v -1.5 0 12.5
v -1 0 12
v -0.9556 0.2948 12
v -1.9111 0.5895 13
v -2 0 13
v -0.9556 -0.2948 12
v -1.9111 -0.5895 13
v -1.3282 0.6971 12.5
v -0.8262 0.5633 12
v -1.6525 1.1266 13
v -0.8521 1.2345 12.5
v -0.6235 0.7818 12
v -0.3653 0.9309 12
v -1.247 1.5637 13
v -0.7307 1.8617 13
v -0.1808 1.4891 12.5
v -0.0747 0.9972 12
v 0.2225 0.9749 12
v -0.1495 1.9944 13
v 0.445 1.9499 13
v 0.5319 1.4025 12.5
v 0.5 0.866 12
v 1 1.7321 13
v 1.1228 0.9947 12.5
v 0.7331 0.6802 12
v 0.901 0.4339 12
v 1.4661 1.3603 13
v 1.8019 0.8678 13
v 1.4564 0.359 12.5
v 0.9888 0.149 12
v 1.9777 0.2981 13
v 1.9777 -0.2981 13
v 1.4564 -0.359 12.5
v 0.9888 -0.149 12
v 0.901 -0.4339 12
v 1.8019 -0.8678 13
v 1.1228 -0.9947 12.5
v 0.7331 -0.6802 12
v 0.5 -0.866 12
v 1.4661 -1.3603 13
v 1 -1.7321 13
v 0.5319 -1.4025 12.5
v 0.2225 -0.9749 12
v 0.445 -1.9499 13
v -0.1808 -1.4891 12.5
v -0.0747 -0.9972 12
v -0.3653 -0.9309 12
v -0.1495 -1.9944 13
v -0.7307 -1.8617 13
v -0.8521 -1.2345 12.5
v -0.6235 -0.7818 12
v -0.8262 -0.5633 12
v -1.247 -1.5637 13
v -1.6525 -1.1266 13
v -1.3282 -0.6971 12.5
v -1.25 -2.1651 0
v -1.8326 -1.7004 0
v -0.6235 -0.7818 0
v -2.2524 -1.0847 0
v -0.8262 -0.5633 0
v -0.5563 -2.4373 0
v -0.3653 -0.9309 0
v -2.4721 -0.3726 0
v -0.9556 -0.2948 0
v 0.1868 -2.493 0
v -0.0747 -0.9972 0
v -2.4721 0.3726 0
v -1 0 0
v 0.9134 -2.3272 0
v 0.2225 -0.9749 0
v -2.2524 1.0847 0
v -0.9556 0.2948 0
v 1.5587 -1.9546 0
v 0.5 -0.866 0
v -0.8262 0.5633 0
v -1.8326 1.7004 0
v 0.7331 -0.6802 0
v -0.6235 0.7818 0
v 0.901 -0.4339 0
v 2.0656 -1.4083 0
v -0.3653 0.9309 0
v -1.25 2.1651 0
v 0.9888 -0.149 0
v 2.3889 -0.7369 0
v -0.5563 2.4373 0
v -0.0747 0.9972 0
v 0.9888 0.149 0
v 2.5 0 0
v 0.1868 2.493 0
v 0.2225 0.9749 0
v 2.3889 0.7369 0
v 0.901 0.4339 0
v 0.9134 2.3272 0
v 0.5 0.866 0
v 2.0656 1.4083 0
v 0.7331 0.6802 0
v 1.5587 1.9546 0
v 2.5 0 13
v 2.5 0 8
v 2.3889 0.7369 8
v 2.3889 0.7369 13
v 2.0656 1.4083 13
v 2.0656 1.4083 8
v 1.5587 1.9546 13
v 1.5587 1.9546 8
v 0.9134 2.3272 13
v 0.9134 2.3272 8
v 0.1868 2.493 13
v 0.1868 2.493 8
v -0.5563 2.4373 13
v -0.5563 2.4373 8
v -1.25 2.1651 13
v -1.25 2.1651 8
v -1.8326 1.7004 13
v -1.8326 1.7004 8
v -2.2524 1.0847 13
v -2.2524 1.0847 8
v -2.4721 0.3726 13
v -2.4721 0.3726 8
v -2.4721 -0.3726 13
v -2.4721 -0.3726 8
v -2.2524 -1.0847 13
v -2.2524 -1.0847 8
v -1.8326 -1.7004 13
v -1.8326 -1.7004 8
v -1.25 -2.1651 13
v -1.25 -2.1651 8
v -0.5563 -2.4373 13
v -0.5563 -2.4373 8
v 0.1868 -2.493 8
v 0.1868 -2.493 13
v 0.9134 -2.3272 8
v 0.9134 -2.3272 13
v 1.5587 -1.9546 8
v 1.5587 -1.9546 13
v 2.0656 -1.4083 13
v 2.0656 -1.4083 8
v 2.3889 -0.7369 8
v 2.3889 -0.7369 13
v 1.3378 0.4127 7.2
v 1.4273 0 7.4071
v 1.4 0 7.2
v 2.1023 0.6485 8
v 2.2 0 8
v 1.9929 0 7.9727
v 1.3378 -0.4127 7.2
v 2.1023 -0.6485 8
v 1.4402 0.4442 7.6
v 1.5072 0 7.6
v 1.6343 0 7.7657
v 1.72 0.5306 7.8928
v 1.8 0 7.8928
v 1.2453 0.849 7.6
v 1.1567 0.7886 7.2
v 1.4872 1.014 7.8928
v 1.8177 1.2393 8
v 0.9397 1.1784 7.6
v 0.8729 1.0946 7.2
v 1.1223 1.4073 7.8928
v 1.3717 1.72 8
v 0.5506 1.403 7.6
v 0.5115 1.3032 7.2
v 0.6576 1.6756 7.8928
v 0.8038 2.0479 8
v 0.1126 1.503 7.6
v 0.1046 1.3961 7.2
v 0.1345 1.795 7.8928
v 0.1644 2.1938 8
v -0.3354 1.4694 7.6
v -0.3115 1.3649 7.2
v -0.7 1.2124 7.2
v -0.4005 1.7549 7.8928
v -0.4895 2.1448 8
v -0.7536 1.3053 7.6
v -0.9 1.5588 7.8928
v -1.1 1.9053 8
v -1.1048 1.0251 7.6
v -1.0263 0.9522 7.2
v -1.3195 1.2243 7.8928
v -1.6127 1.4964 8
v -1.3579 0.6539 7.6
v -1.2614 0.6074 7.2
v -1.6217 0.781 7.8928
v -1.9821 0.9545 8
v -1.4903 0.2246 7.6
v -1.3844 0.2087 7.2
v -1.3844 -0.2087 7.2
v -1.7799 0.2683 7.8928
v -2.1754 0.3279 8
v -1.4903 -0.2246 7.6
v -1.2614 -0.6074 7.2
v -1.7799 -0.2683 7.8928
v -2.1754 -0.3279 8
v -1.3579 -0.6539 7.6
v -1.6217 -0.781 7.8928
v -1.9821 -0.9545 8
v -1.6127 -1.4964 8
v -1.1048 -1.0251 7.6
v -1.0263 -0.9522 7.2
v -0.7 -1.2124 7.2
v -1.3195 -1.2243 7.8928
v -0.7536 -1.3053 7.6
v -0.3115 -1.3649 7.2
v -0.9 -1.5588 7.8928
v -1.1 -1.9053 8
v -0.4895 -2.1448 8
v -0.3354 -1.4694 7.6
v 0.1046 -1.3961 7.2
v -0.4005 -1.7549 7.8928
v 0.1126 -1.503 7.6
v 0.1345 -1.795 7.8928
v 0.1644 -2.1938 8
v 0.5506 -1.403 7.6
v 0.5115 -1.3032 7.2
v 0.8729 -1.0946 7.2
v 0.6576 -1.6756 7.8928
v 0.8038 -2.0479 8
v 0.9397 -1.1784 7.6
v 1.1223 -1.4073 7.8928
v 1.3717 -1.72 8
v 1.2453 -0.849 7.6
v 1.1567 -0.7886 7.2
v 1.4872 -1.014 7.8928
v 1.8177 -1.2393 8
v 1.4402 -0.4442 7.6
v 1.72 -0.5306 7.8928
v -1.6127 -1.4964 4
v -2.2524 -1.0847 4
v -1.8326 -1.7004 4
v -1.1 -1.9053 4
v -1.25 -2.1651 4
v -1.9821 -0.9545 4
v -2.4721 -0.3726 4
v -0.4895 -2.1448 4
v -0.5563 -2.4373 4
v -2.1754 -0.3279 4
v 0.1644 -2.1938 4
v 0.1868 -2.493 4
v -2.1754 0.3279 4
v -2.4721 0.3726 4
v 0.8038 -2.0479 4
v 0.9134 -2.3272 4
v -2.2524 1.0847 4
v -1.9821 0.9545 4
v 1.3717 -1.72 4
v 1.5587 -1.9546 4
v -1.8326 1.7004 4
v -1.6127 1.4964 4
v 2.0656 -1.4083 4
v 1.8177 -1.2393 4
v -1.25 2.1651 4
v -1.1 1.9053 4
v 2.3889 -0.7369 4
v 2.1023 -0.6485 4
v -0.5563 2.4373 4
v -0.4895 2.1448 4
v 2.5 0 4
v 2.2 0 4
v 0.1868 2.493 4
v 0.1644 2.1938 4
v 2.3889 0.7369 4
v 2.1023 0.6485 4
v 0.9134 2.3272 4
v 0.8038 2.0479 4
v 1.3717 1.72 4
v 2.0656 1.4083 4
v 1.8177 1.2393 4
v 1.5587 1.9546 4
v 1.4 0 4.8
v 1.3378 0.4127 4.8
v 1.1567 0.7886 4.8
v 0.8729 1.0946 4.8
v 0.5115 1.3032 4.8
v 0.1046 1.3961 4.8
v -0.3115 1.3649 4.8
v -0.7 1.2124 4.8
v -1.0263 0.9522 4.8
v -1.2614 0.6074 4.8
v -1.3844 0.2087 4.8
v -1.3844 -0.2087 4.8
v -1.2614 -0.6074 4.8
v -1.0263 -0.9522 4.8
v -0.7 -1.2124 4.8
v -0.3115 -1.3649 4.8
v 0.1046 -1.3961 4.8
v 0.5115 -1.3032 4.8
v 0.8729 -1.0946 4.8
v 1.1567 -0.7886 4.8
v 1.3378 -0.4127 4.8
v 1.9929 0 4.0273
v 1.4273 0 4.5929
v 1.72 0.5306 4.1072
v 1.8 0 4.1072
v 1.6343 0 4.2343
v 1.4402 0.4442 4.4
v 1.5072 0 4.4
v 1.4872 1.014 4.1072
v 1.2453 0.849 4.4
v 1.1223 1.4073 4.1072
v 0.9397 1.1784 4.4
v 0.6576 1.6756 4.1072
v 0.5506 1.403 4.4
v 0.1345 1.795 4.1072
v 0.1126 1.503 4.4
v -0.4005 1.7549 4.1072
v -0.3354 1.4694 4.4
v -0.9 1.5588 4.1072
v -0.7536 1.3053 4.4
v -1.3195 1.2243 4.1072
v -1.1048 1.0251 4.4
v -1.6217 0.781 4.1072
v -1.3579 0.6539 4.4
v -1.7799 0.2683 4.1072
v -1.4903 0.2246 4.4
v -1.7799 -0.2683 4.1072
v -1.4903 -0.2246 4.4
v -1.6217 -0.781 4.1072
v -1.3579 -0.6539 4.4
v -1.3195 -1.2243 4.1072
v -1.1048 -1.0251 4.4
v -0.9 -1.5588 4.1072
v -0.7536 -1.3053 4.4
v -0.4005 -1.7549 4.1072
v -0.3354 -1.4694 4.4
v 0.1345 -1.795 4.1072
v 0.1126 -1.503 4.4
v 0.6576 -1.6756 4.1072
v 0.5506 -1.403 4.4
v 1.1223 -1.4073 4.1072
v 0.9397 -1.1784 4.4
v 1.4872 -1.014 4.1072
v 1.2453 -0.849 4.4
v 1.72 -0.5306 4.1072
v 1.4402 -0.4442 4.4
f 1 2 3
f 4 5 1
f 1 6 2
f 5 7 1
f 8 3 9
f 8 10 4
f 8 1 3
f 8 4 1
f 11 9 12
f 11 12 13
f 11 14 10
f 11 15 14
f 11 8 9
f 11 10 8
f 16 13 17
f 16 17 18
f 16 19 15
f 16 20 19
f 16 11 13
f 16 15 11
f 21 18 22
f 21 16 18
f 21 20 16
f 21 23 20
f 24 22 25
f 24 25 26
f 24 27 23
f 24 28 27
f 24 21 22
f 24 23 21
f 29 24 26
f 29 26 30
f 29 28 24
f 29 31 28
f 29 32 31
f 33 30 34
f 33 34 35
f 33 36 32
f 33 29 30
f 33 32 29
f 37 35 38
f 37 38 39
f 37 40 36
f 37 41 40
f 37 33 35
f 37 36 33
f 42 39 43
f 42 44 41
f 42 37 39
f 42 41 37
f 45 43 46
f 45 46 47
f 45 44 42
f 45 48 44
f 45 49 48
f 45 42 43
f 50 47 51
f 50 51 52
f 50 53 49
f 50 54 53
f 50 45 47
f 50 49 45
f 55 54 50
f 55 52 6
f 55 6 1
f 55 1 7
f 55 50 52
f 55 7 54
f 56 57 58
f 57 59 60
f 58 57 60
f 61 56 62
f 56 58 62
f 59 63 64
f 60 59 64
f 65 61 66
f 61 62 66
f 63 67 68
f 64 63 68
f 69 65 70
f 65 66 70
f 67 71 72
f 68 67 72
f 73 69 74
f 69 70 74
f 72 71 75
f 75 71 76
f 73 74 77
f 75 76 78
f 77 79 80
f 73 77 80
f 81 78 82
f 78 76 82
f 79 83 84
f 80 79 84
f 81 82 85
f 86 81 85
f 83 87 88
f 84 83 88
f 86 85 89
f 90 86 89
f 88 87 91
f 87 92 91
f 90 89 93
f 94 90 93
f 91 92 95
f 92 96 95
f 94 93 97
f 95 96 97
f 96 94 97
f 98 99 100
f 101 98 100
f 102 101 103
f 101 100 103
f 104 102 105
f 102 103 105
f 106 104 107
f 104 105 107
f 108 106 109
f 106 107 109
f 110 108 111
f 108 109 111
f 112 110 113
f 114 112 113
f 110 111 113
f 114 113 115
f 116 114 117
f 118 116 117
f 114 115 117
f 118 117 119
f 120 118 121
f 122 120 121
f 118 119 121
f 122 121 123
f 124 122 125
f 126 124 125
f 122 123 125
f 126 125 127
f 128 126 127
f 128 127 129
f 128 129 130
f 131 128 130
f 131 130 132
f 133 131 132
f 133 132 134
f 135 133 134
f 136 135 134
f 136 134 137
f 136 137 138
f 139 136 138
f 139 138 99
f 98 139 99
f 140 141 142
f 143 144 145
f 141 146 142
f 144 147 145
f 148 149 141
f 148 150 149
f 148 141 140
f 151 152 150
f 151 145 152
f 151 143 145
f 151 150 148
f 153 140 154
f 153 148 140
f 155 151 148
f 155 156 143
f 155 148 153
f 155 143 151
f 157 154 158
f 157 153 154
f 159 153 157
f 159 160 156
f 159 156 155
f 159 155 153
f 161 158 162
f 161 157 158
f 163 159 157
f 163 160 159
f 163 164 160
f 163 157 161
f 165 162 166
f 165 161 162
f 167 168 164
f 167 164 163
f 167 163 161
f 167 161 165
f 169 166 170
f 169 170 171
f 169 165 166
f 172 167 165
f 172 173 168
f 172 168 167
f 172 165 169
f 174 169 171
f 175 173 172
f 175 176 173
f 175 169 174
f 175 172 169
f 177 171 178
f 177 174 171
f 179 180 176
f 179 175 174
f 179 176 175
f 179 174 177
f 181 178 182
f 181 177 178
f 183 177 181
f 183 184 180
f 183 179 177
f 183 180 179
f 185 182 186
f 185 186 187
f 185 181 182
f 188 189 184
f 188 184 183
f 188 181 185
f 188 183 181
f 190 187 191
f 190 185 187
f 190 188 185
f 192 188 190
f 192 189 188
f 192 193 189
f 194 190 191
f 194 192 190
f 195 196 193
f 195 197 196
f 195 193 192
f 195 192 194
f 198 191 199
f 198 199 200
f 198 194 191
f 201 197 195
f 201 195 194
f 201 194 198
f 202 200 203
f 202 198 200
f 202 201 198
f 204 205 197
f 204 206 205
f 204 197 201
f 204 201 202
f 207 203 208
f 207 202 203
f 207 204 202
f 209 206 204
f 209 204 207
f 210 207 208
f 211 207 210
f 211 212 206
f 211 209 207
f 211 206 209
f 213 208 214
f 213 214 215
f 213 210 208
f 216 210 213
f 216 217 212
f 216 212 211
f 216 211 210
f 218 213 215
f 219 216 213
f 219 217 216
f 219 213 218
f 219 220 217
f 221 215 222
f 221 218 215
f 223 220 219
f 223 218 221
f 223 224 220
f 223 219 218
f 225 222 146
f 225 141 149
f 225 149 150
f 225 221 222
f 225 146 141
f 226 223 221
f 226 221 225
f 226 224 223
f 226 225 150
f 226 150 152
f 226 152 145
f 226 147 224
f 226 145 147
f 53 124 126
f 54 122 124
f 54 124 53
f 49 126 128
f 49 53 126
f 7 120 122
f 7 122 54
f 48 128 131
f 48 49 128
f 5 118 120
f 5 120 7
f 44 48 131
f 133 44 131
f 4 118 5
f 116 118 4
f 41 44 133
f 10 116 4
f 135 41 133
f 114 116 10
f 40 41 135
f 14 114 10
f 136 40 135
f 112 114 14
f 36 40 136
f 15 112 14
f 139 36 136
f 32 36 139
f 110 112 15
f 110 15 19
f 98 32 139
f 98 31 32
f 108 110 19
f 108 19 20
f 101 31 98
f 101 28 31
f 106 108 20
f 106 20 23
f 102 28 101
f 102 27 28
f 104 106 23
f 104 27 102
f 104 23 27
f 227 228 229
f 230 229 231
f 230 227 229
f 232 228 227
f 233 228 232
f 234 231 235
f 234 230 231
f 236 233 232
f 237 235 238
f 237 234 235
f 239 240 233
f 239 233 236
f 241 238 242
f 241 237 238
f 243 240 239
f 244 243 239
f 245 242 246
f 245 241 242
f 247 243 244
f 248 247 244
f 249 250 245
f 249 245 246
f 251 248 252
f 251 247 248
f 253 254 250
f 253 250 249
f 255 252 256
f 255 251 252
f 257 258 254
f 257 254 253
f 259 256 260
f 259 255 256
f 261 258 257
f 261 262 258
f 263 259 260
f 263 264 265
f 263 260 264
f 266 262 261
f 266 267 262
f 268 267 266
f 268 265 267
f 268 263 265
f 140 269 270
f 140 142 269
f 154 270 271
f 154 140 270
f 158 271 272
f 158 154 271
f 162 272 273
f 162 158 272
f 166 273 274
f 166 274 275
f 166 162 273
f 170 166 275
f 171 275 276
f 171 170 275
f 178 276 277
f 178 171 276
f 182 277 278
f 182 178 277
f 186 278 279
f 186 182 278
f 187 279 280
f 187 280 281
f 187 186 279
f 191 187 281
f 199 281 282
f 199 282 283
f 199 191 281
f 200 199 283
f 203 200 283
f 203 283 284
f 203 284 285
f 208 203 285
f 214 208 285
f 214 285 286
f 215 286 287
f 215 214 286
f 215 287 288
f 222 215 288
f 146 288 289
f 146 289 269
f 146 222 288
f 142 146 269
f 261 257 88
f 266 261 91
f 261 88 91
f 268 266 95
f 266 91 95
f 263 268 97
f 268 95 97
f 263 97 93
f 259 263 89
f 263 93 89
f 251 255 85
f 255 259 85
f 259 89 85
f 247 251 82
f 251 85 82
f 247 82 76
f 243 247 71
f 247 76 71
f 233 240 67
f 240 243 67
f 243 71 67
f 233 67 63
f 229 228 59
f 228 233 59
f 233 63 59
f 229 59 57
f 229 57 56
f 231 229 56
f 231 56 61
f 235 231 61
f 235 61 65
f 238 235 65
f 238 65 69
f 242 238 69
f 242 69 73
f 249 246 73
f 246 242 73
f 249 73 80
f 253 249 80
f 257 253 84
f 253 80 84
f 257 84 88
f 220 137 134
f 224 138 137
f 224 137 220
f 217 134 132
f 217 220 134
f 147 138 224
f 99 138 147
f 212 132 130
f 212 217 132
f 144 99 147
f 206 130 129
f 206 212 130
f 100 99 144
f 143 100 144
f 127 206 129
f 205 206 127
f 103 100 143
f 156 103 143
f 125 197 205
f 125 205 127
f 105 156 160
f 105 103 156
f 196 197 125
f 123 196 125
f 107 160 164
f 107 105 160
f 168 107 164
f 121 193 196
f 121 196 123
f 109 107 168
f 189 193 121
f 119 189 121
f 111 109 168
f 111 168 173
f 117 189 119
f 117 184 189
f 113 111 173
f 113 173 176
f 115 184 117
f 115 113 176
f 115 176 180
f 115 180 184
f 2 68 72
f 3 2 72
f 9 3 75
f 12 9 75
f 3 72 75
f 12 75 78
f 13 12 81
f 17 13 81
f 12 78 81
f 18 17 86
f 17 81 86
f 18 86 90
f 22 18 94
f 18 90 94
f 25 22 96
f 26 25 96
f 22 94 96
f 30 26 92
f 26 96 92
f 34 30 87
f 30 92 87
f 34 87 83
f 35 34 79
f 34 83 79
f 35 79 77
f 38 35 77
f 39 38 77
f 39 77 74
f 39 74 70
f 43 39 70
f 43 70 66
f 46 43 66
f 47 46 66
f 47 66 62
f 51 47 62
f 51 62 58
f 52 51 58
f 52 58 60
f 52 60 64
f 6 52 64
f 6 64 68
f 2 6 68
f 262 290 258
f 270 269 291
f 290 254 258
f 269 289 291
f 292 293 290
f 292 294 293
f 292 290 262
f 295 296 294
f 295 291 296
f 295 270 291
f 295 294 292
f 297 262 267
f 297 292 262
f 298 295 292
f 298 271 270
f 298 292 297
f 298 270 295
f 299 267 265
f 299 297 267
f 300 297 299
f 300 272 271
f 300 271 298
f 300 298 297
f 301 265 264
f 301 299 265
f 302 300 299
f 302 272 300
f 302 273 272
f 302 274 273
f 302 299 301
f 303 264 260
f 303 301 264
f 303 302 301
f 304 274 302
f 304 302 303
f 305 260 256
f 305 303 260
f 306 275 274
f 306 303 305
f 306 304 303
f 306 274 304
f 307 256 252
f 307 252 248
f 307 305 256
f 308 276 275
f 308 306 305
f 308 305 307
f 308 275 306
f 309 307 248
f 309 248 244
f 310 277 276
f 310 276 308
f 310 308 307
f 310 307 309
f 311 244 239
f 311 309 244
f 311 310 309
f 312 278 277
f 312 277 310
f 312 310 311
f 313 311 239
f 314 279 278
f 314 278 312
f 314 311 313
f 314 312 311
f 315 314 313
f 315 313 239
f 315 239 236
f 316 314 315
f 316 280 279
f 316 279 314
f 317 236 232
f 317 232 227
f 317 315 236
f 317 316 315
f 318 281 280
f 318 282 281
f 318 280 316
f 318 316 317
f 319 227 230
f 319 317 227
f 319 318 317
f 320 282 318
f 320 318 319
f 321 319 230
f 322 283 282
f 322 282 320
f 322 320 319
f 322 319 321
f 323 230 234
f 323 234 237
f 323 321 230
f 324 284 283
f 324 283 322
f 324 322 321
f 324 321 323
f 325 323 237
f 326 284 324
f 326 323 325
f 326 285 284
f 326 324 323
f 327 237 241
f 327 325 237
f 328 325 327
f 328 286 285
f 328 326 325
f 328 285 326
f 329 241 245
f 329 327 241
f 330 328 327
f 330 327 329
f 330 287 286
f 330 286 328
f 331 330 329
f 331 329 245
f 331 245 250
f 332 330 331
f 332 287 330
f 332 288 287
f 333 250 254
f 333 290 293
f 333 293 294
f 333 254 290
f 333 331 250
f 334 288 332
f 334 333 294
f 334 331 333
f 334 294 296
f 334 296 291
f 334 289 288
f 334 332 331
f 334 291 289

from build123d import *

# Parameters (mm, degrees)
SKETCH1_R                = 2.5
BOSS_EXTRUDE1_DEPTH      = 13
F_2_0_2_DIAMETER_HOLE1_D = 2
CHAMFER2_SIZE            = 1


with BuildPart() as part:
    # Sketch1 → Boss-Extrude1 (new body)
    with BuildSketch(Plane.XY):
        Circle(SKETCH1_R)
    extrude(amount=BOSS_EXTRUDE1_DEPTH)

    # Sketch3 → Cut-Revolve1 (revolve, cut)
    with BuildSketch(Plane(origin=(0, 0, 0), x_dir=(1, 0, 0), z_dir=(0, 1, 0))):
        with BuildLine():
            Line((3.138230266, -4), (2.2, -4))
            ThreePointArc((2.2, -4), (1.634314575, -4.234314575), (1.4, -4.8))
            Line((1.4, -4.8), (1.4, -7.2))
            ThreePointArc((1.4, -7.2), (1.634314575, -7.765685425), (2.2, -8))
            Line((2.2, -8), (3.138230266, -8))
            Line((3.138230266, -8), (3.138230266, -4))
        make_face()
    revolve(axis=Axis((0, 0, 0), (0, 0, 1)), mode=Mode.SUBTRACT)

    # Ø2.0 (2) Diameter Hole1 (through all)
    with Locations(Plane.XY.offset(13)):
        with Locations((0, 0)):
            Hole(F_2_0_2_DIAMETER_HOLE1_D / 2)

    # Chamfer2
    chamfer2_edges = [part.edges().sort_by_distance(p)[0] for p in [
        (1, 0, 13),
    ]]
    chamfer(chamfer2_edges, length=CHAMFER2_SIZE)


solid = part.part
